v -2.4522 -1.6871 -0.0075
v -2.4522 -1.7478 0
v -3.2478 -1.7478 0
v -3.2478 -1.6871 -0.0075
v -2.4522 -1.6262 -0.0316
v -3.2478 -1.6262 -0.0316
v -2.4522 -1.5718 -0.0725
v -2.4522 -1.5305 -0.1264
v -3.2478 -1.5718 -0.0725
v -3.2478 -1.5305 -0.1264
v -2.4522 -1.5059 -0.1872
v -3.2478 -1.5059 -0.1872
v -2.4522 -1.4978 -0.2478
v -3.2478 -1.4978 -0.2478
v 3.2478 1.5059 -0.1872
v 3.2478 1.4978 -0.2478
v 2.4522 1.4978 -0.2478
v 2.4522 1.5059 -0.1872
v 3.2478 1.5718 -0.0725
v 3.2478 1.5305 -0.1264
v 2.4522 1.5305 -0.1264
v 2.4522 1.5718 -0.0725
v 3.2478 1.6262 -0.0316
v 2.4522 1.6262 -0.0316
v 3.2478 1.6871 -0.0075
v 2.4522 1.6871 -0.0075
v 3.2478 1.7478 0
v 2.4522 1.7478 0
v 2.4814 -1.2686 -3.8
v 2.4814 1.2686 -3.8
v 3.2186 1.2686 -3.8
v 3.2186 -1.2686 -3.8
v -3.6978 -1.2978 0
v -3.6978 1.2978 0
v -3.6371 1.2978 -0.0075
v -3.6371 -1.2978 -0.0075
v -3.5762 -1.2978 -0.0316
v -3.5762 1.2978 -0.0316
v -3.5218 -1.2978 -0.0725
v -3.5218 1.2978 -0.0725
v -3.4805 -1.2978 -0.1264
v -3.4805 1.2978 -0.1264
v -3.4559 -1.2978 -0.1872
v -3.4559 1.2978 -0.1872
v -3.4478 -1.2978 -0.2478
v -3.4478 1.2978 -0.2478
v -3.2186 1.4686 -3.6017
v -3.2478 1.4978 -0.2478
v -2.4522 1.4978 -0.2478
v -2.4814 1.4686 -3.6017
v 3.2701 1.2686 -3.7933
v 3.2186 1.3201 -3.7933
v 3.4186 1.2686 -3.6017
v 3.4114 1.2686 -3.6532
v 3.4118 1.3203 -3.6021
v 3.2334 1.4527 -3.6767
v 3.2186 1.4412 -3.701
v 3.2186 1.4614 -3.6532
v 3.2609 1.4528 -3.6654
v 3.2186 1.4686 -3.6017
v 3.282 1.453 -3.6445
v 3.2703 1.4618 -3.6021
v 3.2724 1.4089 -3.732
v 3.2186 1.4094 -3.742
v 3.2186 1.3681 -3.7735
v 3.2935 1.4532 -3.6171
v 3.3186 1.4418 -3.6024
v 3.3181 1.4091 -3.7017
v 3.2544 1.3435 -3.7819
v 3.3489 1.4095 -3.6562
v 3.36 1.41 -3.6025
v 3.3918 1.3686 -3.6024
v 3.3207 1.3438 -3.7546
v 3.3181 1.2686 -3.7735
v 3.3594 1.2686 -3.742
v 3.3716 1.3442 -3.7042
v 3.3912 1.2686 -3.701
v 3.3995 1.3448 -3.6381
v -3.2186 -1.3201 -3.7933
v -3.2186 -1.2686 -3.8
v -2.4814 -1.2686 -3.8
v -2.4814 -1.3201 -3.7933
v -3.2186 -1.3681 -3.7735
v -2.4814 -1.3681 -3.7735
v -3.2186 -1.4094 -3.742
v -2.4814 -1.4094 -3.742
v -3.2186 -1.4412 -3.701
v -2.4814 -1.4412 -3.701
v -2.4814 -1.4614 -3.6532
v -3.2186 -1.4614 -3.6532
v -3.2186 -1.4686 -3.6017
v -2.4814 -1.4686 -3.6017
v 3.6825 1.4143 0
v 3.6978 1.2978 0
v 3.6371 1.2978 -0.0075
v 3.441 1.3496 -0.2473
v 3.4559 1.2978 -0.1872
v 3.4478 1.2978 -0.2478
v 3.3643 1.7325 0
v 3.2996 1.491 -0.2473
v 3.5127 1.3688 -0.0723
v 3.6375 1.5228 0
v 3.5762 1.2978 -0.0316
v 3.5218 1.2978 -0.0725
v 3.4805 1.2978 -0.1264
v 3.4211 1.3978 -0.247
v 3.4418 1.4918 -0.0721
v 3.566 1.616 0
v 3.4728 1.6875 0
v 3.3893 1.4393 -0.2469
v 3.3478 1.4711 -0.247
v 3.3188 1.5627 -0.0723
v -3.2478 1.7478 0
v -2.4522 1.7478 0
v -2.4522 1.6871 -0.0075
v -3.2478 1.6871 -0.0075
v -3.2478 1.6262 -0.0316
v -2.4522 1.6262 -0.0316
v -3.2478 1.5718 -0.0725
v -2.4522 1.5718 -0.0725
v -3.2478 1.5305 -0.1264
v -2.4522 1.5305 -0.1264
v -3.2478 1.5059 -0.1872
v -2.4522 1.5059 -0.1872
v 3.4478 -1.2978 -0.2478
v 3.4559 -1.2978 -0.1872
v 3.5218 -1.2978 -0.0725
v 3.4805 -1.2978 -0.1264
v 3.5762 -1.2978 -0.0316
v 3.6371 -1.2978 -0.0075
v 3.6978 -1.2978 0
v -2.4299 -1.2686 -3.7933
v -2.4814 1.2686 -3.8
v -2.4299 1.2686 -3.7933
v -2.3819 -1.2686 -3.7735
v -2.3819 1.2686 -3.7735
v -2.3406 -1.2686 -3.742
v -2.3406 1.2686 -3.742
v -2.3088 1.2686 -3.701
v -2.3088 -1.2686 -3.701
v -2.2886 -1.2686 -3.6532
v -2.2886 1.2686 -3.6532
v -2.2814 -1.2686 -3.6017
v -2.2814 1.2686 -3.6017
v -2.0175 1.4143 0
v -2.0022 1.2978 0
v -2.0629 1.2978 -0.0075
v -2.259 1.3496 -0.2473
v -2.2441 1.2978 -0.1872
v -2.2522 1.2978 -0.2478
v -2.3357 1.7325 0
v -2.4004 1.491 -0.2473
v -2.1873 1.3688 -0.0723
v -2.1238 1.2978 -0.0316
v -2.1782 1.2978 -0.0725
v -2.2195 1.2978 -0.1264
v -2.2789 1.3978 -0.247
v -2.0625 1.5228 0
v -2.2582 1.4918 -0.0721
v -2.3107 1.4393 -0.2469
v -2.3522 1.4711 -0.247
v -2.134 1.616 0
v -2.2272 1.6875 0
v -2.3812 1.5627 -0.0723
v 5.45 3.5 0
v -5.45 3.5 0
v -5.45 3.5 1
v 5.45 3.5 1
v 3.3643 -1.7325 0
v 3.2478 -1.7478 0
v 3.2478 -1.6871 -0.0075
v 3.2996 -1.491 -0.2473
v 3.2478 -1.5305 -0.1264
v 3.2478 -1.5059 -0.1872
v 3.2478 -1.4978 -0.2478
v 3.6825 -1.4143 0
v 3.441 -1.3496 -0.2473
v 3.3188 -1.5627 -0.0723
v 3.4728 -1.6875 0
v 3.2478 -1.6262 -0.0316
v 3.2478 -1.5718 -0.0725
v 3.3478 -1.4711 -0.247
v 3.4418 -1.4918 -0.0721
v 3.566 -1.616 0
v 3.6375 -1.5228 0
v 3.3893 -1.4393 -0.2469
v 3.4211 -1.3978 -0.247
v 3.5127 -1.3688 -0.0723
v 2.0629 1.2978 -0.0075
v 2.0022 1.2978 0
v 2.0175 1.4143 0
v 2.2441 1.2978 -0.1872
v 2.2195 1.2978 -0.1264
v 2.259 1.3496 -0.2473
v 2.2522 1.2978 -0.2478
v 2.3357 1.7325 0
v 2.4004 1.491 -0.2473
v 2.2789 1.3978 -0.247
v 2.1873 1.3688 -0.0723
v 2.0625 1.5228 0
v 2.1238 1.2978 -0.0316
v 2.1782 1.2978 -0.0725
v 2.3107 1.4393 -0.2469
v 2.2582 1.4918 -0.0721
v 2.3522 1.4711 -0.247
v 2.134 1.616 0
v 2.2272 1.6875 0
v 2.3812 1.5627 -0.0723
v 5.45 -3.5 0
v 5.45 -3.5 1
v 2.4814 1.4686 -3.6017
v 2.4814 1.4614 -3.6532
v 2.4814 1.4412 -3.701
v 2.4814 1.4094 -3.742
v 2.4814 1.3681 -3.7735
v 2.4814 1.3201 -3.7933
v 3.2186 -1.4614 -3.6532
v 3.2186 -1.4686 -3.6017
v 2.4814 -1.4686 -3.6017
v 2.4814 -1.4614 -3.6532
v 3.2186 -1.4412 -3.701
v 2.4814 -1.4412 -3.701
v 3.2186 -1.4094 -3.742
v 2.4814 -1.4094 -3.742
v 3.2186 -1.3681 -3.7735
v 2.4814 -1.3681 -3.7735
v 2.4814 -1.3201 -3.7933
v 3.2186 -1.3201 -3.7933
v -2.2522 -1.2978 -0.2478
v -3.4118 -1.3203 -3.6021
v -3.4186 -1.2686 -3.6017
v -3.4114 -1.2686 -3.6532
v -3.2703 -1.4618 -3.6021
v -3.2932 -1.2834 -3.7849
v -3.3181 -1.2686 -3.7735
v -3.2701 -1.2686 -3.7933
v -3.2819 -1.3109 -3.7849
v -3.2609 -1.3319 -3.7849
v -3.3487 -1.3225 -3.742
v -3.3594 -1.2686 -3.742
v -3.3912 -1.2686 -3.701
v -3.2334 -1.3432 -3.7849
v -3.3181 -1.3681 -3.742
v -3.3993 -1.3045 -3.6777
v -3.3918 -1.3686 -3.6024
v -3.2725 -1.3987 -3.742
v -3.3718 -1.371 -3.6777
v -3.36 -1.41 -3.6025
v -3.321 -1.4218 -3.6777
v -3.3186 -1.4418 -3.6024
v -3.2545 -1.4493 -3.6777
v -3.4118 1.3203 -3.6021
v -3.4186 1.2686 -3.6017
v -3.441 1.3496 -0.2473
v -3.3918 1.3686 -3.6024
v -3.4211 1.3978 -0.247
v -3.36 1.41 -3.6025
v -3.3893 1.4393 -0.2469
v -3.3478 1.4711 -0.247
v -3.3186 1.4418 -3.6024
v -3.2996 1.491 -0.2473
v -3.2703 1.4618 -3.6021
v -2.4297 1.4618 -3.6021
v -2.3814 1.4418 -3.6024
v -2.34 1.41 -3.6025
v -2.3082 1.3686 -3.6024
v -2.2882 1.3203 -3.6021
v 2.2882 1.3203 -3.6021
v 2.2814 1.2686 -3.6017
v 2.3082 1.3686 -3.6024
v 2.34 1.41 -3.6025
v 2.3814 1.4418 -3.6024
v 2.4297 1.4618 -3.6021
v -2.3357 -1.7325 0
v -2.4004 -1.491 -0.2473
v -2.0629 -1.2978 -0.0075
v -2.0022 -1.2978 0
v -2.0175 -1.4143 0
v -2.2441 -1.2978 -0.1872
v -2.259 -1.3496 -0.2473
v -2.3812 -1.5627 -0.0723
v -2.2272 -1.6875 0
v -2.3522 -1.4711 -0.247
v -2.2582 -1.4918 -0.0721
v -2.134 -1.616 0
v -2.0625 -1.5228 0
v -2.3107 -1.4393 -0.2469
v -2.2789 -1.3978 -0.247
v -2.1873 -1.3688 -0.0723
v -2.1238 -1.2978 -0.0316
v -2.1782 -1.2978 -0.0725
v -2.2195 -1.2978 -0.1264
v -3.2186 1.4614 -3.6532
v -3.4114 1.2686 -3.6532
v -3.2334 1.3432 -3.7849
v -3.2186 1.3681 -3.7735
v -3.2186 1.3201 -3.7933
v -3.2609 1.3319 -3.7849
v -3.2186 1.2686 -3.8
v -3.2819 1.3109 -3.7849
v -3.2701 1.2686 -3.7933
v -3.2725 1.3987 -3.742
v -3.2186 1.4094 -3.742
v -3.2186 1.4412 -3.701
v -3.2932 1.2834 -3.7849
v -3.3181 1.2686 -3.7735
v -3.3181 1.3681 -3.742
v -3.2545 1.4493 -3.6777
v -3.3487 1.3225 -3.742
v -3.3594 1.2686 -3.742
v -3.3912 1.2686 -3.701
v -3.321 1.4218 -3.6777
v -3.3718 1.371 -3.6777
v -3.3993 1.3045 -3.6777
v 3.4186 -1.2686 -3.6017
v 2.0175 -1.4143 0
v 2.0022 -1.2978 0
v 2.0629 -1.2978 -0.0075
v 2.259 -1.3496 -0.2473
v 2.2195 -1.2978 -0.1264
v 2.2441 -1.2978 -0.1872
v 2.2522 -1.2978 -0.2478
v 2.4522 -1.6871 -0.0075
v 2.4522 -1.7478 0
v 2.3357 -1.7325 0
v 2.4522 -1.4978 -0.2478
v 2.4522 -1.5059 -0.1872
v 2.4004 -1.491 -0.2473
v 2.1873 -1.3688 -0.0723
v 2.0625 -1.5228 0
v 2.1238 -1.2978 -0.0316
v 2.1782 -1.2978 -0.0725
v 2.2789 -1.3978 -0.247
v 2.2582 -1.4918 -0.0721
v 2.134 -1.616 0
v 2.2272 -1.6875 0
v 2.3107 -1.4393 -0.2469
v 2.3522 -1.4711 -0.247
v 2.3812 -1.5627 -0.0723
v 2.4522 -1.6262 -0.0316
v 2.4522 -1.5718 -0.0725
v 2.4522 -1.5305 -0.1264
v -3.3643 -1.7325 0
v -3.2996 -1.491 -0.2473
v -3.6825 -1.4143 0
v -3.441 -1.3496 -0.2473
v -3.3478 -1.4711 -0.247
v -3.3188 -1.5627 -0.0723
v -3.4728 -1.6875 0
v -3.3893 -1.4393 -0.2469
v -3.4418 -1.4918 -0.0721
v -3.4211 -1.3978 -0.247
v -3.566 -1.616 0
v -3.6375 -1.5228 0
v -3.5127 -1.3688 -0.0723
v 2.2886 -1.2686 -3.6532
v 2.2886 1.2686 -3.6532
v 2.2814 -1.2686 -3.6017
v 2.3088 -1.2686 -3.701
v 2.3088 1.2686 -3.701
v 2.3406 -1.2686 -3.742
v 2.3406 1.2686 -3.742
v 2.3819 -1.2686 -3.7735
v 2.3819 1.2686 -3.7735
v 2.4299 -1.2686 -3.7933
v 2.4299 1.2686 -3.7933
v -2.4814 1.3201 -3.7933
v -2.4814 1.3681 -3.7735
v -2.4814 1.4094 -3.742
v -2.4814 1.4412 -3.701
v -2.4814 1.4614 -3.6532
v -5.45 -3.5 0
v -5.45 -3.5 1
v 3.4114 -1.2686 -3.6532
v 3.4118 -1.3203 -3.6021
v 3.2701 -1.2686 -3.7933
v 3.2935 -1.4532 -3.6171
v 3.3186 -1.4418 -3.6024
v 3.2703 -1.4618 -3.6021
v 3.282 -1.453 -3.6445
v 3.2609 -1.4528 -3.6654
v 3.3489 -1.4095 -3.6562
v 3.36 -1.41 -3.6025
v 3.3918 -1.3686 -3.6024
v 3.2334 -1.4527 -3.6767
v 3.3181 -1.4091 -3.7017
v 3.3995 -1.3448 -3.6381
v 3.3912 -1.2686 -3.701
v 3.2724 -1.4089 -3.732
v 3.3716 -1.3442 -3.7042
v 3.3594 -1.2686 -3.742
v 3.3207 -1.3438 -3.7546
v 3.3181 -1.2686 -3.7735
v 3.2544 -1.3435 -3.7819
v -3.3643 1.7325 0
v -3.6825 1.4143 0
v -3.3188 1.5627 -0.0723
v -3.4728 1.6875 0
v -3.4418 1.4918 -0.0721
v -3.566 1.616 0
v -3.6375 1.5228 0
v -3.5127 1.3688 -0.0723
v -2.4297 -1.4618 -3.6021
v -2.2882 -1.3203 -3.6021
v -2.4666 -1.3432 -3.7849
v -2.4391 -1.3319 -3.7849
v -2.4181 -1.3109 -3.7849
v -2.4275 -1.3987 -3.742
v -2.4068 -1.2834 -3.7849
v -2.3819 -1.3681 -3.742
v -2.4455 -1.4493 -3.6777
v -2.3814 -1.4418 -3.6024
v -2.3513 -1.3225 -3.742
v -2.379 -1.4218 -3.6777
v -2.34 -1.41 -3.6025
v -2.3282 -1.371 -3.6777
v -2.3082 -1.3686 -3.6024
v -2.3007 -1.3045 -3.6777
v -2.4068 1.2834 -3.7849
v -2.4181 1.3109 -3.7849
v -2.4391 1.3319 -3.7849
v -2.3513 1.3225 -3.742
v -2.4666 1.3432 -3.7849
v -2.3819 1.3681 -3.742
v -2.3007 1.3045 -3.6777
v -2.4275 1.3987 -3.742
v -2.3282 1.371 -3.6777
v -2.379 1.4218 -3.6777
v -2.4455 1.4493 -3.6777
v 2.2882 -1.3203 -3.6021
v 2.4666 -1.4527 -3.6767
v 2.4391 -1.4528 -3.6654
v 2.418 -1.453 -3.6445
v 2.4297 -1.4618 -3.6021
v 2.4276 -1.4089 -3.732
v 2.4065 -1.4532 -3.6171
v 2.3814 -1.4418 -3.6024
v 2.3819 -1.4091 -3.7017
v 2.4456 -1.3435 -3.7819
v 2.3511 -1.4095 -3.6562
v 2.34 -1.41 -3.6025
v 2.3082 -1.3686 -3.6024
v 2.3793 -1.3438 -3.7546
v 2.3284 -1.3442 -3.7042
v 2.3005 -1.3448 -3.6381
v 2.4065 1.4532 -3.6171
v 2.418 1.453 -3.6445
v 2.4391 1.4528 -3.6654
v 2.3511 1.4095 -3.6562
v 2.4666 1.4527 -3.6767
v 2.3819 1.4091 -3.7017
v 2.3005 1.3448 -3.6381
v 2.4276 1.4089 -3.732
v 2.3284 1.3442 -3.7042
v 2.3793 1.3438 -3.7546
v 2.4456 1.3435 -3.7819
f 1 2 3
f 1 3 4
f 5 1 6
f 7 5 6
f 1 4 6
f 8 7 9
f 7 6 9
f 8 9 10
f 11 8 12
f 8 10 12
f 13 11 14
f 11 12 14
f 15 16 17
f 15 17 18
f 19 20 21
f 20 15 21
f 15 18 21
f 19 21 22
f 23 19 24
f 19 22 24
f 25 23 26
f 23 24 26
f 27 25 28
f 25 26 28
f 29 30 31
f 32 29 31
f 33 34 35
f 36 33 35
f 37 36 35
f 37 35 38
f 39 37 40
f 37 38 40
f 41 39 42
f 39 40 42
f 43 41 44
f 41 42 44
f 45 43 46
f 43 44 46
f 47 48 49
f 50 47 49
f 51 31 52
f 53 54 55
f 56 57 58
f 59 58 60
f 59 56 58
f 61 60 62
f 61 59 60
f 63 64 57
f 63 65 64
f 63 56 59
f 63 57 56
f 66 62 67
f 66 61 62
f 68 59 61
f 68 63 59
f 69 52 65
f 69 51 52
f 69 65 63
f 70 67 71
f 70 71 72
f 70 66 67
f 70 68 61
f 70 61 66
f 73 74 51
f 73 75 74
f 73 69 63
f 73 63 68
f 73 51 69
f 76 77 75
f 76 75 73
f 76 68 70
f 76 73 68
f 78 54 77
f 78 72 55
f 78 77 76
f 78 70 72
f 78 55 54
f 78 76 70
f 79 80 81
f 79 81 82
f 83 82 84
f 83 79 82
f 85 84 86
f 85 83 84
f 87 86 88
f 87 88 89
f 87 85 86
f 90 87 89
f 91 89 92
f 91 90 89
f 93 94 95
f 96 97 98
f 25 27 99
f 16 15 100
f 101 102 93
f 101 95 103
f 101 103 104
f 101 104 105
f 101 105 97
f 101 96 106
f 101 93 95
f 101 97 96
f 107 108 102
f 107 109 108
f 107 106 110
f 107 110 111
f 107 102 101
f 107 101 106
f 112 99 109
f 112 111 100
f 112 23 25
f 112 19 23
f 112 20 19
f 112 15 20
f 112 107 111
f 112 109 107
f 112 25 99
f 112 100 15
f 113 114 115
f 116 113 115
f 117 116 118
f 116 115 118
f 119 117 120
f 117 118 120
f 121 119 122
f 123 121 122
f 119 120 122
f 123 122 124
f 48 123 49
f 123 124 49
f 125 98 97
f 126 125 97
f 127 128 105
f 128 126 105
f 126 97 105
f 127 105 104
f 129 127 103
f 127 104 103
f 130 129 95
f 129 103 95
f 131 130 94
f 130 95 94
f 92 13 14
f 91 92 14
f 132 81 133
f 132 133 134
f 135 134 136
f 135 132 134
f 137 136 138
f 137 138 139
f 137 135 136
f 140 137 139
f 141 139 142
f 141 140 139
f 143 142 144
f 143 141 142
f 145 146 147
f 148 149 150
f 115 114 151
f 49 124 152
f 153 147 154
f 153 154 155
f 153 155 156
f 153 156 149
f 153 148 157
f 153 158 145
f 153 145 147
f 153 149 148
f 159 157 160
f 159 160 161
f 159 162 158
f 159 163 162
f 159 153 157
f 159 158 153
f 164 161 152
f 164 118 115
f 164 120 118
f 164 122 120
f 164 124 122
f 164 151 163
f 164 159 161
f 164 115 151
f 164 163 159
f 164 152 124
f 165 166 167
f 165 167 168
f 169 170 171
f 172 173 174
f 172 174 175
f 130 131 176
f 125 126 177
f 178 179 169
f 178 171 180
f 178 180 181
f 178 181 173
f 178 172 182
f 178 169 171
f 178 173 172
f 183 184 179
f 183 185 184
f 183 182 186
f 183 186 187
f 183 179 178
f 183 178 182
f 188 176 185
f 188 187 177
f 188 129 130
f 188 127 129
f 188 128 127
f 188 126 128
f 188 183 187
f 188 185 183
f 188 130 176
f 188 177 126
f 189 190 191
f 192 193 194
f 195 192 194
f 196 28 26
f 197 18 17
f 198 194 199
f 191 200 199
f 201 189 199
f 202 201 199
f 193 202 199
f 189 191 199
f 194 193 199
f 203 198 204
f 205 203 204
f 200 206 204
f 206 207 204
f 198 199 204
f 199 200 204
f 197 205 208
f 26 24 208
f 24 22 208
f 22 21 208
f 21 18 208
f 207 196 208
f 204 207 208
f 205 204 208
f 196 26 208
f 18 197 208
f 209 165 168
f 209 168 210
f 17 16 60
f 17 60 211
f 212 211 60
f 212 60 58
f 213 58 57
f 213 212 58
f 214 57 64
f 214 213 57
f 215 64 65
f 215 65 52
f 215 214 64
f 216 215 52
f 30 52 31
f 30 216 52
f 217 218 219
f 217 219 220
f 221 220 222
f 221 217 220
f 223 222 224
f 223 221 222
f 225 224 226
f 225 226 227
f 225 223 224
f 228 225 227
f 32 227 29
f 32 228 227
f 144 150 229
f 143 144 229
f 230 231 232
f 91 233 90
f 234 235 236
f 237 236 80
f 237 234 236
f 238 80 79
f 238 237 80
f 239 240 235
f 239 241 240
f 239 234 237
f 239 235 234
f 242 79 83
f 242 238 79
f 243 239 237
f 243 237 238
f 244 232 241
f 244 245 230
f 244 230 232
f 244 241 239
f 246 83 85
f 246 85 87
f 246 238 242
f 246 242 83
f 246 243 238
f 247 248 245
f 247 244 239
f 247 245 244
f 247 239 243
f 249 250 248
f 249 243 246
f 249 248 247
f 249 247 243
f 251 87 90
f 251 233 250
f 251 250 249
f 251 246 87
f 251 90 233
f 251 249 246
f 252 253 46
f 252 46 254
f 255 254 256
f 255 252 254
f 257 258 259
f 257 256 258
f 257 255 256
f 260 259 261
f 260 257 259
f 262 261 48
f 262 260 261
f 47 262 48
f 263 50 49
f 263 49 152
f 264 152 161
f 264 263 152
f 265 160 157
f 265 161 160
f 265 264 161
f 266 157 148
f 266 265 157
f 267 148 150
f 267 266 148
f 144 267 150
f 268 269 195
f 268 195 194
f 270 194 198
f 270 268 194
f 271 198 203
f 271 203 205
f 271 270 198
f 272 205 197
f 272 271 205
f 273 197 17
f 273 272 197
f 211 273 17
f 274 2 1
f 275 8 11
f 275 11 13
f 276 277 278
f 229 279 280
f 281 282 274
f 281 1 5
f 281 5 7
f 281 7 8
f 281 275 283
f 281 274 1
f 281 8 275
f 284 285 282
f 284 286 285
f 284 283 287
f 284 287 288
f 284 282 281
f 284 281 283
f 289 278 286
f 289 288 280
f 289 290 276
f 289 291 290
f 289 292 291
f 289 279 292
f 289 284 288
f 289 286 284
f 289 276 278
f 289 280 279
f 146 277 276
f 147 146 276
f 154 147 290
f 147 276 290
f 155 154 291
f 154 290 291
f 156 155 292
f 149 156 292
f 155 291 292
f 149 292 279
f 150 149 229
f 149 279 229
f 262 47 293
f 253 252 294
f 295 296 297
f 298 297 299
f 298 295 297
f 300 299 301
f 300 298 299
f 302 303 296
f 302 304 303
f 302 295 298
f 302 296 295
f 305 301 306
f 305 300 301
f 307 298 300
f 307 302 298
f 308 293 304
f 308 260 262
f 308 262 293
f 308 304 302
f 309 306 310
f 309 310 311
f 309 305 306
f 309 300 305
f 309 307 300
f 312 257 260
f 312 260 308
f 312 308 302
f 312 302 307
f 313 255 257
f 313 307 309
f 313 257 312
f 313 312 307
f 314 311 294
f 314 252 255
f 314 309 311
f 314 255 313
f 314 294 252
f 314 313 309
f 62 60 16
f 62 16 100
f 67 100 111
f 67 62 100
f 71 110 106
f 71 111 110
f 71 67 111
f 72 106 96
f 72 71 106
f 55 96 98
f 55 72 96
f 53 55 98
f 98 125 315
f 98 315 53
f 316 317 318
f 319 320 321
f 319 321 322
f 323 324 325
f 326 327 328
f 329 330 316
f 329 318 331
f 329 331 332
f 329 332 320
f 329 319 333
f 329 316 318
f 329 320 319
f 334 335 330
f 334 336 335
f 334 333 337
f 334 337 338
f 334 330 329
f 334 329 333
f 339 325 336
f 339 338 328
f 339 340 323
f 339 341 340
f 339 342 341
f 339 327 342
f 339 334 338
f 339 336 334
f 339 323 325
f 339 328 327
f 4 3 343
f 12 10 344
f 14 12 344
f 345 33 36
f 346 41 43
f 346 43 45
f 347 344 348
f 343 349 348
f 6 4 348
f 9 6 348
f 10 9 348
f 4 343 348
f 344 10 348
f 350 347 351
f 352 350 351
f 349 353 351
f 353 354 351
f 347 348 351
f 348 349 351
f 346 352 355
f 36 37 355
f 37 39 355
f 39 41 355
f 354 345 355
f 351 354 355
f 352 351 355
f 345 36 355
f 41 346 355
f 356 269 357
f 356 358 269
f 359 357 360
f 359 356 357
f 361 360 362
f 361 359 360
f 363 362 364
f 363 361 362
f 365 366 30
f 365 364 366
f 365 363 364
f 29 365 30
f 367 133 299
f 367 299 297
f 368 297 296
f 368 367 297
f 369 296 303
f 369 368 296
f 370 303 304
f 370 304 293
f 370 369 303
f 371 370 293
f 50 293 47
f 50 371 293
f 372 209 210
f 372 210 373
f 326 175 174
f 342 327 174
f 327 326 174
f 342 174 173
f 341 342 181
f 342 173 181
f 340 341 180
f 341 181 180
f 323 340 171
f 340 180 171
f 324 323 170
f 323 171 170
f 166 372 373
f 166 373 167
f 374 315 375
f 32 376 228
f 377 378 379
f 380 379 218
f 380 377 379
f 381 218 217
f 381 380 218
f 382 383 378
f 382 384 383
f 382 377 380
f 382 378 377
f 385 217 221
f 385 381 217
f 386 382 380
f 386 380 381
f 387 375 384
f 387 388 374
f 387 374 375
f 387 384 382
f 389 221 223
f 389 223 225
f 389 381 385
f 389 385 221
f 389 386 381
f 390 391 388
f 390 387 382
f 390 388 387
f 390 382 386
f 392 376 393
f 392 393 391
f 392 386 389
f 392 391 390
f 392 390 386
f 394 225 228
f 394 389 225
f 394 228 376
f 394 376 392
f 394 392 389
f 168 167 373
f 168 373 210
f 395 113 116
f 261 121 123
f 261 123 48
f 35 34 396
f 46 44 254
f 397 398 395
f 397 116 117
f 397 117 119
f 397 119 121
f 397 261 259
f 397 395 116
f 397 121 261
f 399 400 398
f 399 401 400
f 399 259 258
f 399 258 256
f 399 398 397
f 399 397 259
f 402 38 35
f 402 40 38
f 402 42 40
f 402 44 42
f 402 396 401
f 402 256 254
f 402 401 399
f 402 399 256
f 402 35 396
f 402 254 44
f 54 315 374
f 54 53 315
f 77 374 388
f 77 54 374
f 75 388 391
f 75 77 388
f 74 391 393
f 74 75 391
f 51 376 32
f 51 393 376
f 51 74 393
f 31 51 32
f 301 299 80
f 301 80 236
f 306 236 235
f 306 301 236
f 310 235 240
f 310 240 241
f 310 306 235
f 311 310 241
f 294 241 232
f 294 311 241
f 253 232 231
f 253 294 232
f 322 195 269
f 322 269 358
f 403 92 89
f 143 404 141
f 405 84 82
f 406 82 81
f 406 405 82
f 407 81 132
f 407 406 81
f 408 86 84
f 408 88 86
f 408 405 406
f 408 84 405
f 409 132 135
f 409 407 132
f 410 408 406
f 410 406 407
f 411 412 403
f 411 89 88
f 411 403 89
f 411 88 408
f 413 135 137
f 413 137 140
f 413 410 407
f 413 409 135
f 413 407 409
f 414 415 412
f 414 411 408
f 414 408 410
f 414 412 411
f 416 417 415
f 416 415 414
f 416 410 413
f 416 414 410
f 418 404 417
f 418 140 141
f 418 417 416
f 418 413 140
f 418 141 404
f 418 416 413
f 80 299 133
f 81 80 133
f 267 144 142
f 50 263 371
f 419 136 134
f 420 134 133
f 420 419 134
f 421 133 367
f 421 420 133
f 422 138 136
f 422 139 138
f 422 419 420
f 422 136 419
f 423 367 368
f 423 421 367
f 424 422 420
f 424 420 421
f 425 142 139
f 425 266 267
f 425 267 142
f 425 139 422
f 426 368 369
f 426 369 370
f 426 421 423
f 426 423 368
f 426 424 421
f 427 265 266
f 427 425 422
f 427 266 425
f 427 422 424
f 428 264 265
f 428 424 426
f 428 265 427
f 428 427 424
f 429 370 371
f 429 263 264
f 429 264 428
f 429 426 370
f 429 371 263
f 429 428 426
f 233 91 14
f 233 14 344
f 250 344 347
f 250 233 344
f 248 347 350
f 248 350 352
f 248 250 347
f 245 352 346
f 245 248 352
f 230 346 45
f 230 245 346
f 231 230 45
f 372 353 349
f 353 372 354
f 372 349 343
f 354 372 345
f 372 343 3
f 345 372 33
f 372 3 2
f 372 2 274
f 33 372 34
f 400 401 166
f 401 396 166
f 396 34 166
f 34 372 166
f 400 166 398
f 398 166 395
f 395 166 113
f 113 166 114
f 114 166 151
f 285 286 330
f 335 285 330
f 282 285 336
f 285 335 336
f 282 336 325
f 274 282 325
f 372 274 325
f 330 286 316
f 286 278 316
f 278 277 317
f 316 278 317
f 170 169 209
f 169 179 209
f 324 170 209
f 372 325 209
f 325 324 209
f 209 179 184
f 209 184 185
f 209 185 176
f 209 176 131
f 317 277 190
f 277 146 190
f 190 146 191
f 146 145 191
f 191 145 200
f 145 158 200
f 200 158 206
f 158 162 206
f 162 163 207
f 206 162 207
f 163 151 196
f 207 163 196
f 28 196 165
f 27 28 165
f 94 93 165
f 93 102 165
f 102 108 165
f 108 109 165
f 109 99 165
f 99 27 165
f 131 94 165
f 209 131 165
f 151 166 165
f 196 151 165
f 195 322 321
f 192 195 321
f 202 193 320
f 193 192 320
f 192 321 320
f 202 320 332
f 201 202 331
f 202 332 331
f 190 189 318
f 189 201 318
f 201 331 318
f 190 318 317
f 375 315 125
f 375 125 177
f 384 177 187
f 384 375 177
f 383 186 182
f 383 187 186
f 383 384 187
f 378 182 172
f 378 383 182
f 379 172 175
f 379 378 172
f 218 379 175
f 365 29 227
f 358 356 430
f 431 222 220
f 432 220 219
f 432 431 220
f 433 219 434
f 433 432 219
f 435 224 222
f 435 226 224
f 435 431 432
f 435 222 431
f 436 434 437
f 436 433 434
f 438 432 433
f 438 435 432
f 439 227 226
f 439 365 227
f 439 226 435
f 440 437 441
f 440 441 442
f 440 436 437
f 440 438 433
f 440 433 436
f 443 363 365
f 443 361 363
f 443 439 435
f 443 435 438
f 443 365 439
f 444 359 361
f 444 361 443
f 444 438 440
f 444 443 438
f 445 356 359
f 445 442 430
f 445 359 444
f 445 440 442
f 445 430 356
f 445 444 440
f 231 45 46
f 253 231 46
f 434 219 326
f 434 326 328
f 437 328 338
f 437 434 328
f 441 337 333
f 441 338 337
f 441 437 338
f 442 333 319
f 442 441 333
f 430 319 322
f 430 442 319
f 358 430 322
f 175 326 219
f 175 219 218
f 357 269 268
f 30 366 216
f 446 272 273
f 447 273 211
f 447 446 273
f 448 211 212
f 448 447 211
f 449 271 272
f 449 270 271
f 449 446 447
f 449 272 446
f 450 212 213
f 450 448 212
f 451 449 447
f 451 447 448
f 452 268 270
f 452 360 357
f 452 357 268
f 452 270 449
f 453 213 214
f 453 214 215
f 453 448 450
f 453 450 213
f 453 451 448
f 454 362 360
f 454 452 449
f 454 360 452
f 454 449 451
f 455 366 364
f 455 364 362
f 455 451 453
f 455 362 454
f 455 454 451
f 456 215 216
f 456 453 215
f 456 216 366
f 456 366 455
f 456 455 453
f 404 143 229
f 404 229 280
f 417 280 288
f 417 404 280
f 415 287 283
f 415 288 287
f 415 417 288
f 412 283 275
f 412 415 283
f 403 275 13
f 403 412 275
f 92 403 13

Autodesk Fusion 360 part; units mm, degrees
sketch "Sketch1" plane through (0, 0, 0) normal (0, 0, 1) x (1, 0, 0)
  line L0 (-3.45, 1.5) -> (-2.25, 1.5)
  line L1 (-2.25, 1.5) -> (-2.25, -1.5)
  line L2 (-2.25, -1.5) -> (-3.45, -1.5)
  line L3 (-3.45, -1.5) -> (-3.45, 1.5)
  line L4 (-5.45, -1.5) -> (-5.45, 1.5) construction
  line L5 (-3.45, 3.5) -> (-2.25, 3.5) construction
  line L6 (-3.45, 3.5) -> (-5.45, 3.5) construction
  line L7 (-5.45, 3.5) -> (-5.45, 1.5) construction
  line L8 (-5.45, 3.5) -> (5.45, 3.5)
  line L9 (5.45, 3.5) -> (5.45, -3.5)
  line L10 (5.45, -3.5) -> (-5.45, -3.5)
  line L11 (-5.45, -3.5) -> (-5.45, 3.5)
  line L12 (0, 1.75) -> (0, 22.5) construction
  line L13 (2.25, 1.5) -> (2.25, -1.5)
  line L14 (2.25, -1.5) -> (3.45, -1.5)
  line L15 (3.45, -1.5) -> (3.45, 1.5)
  line L16 (3.45, 1.5) -> (2.25, 1.5)
  line L17 (1.75, 0) -> (22.5, 0) construction
  dimension "d2" = 1.2
  dimension "d3" = 3
  dimension "d8" = -2
  dimension "d9" = -2
  dimension "d20" = 4.5
  dimension "d21" = 2
  dimension "d22" = 2
  dimension "d23" = 1.5
extrude "Extrude1" add sketch "Sketch1" against normal blind 3.8 draft -0.5 contours L0 L1 L2 L3 | L13 L14 L15 L16 makes body 1 at (-2.2611, 0.4889, -1.2667) makes body 2 at (3.4389, -0.4889, -1.2667)
extrude "Extrude2" add sketch "Sketch1" along normal blind 1 contours L0 L1 L2 L3 | L8 L9 L10 L11 | L13 L14 L15 L16 bodies 1 2
fillet "Fillet1" radius 0.2 4 edges at (-2.2666, 1.4834, -1.9) (-2.2666, -1.4834, -1.9) (-3.4334, 1.4834, -1.9) (-3.4334, -1.4834, -1.9) on bodies 1
fillet "Fillet1" radius 0.25 4 edges at (-2.85, -1.5, 0) (-2.25, 0, 0) (-2.85, 1.5, 0) (-3.45, 0, 0) on bodies 1
fillet "Fillet1" radius 0.2 4 edges at (-2.85, 1.4668, -3.8) (-2.2832, 0, -3.8) (-2.85, -1.4668, -3.8) (-3.4168, 0, -3.8) on bodies 1
fillet "Fillet1" radius 0.2 4 edges at (3.4168, 0, -3.8) (2.2832, 0, -3.8) (2.85, -1.4668, -3.8) (2.85, 1.4668, -3.8) on bodies 1
fillet "Fillet1" radius 0.2 4 edges at (3.4334, -1.4834, -1.9) (2.2666, -1.4834, -1.9) (2.2666, 1.4834, -1.9) (3.4334, 1.4834, -1.9) on bodies 1
fillet "Fillet1" radius 0.25 4 edges at (2.25, 0, 0) (2.85, -1.5, 0) (3.45, 0, 0) (2.85, 1.5, 0) on bodies 1
